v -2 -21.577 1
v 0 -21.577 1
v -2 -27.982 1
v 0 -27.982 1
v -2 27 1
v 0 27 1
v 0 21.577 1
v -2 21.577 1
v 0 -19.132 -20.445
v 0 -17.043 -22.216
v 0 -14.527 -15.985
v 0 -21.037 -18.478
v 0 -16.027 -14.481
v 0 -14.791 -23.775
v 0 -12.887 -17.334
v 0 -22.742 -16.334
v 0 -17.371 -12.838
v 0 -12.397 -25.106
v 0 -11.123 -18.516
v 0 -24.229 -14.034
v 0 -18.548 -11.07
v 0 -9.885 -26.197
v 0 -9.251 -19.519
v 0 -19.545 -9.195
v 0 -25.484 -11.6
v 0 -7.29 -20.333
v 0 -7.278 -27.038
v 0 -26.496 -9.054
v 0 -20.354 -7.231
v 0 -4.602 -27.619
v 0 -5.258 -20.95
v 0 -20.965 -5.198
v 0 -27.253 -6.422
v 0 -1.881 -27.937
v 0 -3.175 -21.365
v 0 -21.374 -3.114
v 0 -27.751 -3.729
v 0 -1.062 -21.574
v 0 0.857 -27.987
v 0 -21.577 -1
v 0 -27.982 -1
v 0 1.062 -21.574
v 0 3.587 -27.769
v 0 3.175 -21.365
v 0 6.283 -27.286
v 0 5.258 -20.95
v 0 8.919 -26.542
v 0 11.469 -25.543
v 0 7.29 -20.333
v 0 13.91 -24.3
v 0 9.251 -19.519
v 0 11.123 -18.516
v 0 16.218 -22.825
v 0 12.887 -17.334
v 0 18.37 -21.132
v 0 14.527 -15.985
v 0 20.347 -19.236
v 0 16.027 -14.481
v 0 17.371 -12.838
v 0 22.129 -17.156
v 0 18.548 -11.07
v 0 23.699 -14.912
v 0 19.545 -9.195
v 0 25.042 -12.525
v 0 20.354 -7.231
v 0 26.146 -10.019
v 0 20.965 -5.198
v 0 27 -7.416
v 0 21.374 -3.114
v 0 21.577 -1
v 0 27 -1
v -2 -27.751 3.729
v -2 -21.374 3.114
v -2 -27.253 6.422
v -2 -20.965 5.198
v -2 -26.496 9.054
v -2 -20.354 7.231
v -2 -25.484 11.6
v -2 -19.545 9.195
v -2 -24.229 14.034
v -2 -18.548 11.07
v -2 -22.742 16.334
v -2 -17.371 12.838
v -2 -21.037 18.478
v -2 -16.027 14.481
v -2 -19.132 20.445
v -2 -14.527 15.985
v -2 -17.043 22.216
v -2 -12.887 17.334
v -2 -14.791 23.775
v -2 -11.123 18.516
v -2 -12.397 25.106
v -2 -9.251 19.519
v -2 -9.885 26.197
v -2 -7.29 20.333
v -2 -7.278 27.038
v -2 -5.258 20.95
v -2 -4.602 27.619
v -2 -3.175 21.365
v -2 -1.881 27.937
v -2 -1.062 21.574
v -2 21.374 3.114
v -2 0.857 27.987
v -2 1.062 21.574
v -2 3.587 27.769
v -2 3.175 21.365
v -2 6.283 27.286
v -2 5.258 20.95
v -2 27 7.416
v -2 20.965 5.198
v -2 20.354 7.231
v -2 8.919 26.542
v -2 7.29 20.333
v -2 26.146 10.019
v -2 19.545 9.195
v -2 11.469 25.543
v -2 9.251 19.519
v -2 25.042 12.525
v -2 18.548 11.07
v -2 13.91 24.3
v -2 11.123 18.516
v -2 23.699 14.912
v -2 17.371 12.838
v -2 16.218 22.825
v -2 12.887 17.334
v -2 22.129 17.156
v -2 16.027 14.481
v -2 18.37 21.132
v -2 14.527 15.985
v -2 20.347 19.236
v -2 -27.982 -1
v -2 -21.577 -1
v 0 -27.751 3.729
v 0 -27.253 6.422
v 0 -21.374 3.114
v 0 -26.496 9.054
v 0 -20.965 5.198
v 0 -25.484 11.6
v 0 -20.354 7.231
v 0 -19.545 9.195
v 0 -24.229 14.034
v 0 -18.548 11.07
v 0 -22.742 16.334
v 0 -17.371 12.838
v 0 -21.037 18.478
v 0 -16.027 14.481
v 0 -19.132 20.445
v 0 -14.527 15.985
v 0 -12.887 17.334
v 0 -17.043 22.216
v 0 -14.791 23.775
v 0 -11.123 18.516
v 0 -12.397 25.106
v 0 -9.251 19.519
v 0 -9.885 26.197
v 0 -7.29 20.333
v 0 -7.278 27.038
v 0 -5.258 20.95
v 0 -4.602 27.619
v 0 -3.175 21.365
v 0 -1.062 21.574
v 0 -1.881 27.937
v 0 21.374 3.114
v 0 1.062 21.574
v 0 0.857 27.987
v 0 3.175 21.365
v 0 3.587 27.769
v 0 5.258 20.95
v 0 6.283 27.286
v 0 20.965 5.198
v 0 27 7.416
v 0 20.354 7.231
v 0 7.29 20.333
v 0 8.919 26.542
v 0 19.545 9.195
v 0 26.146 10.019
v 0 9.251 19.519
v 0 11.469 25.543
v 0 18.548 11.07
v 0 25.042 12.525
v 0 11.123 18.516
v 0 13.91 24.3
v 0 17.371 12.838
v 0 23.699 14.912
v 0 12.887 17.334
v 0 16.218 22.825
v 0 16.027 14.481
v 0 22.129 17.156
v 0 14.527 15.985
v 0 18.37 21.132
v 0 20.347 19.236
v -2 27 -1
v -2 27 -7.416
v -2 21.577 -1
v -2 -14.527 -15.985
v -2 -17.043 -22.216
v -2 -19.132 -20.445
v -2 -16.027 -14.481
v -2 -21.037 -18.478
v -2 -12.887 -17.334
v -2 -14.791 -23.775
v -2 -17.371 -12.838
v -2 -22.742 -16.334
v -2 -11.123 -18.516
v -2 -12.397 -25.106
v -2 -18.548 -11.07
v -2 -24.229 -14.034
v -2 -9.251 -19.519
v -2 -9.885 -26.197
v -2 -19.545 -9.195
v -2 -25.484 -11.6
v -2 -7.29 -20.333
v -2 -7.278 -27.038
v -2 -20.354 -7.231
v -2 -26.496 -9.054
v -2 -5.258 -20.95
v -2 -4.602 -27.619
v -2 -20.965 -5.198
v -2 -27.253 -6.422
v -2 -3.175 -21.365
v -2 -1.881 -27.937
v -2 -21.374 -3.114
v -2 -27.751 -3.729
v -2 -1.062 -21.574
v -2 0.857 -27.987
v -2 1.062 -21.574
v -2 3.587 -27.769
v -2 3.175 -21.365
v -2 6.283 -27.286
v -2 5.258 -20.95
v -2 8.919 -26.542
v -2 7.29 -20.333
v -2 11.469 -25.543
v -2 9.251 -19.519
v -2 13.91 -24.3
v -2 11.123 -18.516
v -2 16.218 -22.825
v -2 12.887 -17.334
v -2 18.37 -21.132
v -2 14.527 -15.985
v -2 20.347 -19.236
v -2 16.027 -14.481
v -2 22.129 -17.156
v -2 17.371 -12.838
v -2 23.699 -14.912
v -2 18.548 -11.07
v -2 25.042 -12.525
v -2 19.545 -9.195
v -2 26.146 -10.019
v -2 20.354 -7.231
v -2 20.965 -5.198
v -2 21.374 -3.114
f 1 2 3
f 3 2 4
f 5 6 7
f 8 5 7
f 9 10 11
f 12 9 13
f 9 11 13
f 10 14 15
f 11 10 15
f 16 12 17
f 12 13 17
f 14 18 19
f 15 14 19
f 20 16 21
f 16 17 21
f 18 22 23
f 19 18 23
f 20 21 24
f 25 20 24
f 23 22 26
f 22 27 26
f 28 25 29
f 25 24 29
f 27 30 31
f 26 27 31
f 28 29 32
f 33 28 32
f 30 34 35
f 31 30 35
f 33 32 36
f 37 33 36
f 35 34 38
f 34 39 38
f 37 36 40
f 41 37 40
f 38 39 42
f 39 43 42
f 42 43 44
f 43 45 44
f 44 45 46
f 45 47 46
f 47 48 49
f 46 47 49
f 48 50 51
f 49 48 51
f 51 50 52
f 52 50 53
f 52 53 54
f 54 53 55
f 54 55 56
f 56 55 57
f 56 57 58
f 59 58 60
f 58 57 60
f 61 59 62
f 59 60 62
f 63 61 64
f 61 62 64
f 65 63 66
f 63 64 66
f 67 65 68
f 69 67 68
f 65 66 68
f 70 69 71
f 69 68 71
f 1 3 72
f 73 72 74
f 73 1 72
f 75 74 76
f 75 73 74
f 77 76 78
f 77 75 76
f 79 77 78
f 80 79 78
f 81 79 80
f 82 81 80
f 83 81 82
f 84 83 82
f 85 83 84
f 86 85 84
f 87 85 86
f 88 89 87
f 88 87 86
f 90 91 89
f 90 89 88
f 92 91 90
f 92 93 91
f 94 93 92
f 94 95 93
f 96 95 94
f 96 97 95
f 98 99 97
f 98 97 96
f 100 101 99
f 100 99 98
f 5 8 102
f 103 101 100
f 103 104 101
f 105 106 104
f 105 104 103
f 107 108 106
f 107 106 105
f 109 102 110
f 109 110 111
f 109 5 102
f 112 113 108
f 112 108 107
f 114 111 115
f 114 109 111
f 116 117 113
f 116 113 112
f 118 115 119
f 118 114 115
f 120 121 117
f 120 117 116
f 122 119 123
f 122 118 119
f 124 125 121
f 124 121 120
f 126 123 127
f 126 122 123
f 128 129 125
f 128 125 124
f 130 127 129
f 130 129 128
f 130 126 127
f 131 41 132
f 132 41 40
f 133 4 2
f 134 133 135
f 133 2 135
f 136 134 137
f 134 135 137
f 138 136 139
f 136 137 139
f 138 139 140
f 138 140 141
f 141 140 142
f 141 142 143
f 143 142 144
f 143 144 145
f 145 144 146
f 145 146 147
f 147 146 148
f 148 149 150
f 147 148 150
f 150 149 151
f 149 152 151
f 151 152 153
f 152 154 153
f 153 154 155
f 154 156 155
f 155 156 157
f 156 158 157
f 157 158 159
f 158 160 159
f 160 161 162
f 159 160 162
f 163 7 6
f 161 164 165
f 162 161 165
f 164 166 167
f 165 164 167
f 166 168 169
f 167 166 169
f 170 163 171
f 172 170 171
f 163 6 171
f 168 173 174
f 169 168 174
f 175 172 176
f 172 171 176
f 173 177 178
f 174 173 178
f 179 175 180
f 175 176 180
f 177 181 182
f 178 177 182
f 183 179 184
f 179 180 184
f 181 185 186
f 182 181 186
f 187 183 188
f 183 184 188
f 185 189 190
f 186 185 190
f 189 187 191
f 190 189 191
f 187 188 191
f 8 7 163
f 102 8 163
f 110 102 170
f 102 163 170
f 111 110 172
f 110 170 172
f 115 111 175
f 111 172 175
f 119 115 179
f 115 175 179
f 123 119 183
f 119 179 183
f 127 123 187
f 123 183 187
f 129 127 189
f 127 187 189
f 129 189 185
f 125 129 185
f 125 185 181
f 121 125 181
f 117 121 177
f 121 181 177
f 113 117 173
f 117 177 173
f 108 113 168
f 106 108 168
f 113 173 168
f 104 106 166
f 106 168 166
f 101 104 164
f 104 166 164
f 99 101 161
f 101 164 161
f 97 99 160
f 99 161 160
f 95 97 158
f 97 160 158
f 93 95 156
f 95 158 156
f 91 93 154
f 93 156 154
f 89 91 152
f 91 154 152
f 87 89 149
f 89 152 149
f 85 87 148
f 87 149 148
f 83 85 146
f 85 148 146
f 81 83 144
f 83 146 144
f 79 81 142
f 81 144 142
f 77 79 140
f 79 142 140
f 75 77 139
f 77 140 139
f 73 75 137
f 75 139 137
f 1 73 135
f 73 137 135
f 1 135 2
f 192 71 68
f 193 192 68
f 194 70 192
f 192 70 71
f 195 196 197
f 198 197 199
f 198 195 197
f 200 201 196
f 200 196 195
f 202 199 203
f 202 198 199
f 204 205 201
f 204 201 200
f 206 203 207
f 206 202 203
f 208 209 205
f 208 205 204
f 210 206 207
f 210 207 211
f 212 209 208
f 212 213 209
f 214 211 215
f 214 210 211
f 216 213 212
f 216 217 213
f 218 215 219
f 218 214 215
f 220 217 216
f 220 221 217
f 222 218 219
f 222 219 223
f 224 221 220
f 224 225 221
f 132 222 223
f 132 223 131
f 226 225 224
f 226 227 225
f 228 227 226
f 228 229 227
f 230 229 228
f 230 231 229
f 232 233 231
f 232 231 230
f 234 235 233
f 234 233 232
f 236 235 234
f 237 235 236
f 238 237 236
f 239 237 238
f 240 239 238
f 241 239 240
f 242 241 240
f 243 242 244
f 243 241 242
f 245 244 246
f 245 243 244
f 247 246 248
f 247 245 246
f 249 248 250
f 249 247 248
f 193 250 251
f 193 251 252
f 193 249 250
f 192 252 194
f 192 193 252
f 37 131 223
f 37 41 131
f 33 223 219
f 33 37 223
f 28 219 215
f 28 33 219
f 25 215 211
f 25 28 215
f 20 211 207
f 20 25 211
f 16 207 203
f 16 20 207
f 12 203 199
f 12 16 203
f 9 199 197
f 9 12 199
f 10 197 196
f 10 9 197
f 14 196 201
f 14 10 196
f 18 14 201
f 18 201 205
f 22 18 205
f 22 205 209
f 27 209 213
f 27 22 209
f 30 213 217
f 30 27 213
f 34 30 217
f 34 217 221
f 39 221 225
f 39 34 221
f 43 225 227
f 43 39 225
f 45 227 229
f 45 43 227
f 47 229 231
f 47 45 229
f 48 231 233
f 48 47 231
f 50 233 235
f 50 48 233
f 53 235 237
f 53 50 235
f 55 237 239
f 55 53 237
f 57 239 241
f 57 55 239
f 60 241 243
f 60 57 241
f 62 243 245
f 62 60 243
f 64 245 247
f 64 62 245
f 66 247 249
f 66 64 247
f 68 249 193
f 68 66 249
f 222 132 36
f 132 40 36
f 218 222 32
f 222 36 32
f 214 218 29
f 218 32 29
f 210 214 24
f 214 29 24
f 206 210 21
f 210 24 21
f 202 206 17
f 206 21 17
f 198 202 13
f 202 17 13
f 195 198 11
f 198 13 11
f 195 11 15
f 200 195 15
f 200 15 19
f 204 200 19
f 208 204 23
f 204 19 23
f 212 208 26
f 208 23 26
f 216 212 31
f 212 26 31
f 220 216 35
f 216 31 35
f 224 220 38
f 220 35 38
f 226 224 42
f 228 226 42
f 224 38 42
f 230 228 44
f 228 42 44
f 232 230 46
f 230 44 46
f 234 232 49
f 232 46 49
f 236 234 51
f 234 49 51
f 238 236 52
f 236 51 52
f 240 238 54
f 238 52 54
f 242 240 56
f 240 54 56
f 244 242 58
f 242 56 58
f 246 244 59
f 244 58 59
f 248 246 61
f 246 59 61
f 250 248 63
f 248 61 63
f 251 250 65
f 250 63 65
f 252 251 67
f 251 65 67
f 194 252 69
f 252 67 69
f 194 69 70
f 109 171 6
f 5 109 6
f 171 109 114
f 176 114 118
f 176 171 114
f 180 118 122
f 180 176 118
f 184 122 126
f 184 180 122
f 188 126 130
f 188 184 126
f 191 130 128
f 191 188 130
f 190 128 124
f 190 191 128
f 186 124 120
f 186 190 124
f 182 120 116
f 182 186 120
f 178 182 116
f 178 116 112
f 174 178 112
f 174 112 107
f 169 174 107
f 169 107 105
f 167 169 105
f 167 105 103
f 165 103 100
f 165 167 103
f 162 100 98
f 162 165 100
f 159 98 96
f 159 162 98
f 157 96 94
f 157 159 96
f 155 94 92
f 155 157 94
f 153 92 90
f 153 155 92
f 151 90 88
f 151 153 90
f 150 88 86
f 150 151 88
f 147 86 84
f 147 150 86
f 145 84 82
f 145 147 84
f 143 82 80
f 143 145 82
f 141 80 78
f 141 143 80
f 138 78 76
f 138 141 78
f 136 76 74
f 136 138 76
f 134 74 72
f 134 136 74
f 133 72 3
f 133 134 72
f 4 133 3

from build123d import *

# Parameters (mm, degrees)
SKETCH_1_W          = 2
SKETCH_1_H          = 6.4
CUT_EXTRUDE_1_DEPTH = 3


with BuildPart() as part:
    # Эскиз1 → Повернуть1 (revolve)
    with BuildSketch(Plane(origin=(0, 0, 0), x_dir=(1, 0, 0), z_dir=(0, 1, 0))):
        with Locations((-1, 24.8)):
            Rectangle(SKETCH_1_W, SKETCH_1_H)
    revolve(axis=Axis((-20.865906448, 0, 0), (1, 0, 0)))

    # Эскиз2 → Вырез-Вытянуть1 (cut, through all)
    with BuildSketch(Plane(origin=(0, 0, 0), x_dir=(0, 0, -1), z_dir=(1, 0, 0))):
        with BuildLine():
            ThreePointArc((-1, -27.982137159), (0, -28), (1, -27.982137159))
            Line((1, -27.982137159), (1, -21.576839435))
            ThreePointArc((1, -21.576839435), (0, -21.6), (-1, -21.576839435))
            Line((-1, -21.576839435), (-1, -27.982137159))
        make_face()
        with BuildLine():
            ThreePointArc((-1, 21.576839435), (0, 21.6), (1, 21.576839435))
            Line((1, 21.576839435), (1, 27))
            Line((1, 27), (7.416198487, 27))
            ThreePointArc((7.416198487, 27), (0, 28), (-7.416198487, 27))
            Line((-7.416198487, 27), (-1, 27))
            Line((-1, 27), (-1, 21.576839435))
        make_face()
    extrude(amount=-CUT_EXTRUDE_1_DEPTH, mode=Mode.SUBTRACT)


solid = part.part
